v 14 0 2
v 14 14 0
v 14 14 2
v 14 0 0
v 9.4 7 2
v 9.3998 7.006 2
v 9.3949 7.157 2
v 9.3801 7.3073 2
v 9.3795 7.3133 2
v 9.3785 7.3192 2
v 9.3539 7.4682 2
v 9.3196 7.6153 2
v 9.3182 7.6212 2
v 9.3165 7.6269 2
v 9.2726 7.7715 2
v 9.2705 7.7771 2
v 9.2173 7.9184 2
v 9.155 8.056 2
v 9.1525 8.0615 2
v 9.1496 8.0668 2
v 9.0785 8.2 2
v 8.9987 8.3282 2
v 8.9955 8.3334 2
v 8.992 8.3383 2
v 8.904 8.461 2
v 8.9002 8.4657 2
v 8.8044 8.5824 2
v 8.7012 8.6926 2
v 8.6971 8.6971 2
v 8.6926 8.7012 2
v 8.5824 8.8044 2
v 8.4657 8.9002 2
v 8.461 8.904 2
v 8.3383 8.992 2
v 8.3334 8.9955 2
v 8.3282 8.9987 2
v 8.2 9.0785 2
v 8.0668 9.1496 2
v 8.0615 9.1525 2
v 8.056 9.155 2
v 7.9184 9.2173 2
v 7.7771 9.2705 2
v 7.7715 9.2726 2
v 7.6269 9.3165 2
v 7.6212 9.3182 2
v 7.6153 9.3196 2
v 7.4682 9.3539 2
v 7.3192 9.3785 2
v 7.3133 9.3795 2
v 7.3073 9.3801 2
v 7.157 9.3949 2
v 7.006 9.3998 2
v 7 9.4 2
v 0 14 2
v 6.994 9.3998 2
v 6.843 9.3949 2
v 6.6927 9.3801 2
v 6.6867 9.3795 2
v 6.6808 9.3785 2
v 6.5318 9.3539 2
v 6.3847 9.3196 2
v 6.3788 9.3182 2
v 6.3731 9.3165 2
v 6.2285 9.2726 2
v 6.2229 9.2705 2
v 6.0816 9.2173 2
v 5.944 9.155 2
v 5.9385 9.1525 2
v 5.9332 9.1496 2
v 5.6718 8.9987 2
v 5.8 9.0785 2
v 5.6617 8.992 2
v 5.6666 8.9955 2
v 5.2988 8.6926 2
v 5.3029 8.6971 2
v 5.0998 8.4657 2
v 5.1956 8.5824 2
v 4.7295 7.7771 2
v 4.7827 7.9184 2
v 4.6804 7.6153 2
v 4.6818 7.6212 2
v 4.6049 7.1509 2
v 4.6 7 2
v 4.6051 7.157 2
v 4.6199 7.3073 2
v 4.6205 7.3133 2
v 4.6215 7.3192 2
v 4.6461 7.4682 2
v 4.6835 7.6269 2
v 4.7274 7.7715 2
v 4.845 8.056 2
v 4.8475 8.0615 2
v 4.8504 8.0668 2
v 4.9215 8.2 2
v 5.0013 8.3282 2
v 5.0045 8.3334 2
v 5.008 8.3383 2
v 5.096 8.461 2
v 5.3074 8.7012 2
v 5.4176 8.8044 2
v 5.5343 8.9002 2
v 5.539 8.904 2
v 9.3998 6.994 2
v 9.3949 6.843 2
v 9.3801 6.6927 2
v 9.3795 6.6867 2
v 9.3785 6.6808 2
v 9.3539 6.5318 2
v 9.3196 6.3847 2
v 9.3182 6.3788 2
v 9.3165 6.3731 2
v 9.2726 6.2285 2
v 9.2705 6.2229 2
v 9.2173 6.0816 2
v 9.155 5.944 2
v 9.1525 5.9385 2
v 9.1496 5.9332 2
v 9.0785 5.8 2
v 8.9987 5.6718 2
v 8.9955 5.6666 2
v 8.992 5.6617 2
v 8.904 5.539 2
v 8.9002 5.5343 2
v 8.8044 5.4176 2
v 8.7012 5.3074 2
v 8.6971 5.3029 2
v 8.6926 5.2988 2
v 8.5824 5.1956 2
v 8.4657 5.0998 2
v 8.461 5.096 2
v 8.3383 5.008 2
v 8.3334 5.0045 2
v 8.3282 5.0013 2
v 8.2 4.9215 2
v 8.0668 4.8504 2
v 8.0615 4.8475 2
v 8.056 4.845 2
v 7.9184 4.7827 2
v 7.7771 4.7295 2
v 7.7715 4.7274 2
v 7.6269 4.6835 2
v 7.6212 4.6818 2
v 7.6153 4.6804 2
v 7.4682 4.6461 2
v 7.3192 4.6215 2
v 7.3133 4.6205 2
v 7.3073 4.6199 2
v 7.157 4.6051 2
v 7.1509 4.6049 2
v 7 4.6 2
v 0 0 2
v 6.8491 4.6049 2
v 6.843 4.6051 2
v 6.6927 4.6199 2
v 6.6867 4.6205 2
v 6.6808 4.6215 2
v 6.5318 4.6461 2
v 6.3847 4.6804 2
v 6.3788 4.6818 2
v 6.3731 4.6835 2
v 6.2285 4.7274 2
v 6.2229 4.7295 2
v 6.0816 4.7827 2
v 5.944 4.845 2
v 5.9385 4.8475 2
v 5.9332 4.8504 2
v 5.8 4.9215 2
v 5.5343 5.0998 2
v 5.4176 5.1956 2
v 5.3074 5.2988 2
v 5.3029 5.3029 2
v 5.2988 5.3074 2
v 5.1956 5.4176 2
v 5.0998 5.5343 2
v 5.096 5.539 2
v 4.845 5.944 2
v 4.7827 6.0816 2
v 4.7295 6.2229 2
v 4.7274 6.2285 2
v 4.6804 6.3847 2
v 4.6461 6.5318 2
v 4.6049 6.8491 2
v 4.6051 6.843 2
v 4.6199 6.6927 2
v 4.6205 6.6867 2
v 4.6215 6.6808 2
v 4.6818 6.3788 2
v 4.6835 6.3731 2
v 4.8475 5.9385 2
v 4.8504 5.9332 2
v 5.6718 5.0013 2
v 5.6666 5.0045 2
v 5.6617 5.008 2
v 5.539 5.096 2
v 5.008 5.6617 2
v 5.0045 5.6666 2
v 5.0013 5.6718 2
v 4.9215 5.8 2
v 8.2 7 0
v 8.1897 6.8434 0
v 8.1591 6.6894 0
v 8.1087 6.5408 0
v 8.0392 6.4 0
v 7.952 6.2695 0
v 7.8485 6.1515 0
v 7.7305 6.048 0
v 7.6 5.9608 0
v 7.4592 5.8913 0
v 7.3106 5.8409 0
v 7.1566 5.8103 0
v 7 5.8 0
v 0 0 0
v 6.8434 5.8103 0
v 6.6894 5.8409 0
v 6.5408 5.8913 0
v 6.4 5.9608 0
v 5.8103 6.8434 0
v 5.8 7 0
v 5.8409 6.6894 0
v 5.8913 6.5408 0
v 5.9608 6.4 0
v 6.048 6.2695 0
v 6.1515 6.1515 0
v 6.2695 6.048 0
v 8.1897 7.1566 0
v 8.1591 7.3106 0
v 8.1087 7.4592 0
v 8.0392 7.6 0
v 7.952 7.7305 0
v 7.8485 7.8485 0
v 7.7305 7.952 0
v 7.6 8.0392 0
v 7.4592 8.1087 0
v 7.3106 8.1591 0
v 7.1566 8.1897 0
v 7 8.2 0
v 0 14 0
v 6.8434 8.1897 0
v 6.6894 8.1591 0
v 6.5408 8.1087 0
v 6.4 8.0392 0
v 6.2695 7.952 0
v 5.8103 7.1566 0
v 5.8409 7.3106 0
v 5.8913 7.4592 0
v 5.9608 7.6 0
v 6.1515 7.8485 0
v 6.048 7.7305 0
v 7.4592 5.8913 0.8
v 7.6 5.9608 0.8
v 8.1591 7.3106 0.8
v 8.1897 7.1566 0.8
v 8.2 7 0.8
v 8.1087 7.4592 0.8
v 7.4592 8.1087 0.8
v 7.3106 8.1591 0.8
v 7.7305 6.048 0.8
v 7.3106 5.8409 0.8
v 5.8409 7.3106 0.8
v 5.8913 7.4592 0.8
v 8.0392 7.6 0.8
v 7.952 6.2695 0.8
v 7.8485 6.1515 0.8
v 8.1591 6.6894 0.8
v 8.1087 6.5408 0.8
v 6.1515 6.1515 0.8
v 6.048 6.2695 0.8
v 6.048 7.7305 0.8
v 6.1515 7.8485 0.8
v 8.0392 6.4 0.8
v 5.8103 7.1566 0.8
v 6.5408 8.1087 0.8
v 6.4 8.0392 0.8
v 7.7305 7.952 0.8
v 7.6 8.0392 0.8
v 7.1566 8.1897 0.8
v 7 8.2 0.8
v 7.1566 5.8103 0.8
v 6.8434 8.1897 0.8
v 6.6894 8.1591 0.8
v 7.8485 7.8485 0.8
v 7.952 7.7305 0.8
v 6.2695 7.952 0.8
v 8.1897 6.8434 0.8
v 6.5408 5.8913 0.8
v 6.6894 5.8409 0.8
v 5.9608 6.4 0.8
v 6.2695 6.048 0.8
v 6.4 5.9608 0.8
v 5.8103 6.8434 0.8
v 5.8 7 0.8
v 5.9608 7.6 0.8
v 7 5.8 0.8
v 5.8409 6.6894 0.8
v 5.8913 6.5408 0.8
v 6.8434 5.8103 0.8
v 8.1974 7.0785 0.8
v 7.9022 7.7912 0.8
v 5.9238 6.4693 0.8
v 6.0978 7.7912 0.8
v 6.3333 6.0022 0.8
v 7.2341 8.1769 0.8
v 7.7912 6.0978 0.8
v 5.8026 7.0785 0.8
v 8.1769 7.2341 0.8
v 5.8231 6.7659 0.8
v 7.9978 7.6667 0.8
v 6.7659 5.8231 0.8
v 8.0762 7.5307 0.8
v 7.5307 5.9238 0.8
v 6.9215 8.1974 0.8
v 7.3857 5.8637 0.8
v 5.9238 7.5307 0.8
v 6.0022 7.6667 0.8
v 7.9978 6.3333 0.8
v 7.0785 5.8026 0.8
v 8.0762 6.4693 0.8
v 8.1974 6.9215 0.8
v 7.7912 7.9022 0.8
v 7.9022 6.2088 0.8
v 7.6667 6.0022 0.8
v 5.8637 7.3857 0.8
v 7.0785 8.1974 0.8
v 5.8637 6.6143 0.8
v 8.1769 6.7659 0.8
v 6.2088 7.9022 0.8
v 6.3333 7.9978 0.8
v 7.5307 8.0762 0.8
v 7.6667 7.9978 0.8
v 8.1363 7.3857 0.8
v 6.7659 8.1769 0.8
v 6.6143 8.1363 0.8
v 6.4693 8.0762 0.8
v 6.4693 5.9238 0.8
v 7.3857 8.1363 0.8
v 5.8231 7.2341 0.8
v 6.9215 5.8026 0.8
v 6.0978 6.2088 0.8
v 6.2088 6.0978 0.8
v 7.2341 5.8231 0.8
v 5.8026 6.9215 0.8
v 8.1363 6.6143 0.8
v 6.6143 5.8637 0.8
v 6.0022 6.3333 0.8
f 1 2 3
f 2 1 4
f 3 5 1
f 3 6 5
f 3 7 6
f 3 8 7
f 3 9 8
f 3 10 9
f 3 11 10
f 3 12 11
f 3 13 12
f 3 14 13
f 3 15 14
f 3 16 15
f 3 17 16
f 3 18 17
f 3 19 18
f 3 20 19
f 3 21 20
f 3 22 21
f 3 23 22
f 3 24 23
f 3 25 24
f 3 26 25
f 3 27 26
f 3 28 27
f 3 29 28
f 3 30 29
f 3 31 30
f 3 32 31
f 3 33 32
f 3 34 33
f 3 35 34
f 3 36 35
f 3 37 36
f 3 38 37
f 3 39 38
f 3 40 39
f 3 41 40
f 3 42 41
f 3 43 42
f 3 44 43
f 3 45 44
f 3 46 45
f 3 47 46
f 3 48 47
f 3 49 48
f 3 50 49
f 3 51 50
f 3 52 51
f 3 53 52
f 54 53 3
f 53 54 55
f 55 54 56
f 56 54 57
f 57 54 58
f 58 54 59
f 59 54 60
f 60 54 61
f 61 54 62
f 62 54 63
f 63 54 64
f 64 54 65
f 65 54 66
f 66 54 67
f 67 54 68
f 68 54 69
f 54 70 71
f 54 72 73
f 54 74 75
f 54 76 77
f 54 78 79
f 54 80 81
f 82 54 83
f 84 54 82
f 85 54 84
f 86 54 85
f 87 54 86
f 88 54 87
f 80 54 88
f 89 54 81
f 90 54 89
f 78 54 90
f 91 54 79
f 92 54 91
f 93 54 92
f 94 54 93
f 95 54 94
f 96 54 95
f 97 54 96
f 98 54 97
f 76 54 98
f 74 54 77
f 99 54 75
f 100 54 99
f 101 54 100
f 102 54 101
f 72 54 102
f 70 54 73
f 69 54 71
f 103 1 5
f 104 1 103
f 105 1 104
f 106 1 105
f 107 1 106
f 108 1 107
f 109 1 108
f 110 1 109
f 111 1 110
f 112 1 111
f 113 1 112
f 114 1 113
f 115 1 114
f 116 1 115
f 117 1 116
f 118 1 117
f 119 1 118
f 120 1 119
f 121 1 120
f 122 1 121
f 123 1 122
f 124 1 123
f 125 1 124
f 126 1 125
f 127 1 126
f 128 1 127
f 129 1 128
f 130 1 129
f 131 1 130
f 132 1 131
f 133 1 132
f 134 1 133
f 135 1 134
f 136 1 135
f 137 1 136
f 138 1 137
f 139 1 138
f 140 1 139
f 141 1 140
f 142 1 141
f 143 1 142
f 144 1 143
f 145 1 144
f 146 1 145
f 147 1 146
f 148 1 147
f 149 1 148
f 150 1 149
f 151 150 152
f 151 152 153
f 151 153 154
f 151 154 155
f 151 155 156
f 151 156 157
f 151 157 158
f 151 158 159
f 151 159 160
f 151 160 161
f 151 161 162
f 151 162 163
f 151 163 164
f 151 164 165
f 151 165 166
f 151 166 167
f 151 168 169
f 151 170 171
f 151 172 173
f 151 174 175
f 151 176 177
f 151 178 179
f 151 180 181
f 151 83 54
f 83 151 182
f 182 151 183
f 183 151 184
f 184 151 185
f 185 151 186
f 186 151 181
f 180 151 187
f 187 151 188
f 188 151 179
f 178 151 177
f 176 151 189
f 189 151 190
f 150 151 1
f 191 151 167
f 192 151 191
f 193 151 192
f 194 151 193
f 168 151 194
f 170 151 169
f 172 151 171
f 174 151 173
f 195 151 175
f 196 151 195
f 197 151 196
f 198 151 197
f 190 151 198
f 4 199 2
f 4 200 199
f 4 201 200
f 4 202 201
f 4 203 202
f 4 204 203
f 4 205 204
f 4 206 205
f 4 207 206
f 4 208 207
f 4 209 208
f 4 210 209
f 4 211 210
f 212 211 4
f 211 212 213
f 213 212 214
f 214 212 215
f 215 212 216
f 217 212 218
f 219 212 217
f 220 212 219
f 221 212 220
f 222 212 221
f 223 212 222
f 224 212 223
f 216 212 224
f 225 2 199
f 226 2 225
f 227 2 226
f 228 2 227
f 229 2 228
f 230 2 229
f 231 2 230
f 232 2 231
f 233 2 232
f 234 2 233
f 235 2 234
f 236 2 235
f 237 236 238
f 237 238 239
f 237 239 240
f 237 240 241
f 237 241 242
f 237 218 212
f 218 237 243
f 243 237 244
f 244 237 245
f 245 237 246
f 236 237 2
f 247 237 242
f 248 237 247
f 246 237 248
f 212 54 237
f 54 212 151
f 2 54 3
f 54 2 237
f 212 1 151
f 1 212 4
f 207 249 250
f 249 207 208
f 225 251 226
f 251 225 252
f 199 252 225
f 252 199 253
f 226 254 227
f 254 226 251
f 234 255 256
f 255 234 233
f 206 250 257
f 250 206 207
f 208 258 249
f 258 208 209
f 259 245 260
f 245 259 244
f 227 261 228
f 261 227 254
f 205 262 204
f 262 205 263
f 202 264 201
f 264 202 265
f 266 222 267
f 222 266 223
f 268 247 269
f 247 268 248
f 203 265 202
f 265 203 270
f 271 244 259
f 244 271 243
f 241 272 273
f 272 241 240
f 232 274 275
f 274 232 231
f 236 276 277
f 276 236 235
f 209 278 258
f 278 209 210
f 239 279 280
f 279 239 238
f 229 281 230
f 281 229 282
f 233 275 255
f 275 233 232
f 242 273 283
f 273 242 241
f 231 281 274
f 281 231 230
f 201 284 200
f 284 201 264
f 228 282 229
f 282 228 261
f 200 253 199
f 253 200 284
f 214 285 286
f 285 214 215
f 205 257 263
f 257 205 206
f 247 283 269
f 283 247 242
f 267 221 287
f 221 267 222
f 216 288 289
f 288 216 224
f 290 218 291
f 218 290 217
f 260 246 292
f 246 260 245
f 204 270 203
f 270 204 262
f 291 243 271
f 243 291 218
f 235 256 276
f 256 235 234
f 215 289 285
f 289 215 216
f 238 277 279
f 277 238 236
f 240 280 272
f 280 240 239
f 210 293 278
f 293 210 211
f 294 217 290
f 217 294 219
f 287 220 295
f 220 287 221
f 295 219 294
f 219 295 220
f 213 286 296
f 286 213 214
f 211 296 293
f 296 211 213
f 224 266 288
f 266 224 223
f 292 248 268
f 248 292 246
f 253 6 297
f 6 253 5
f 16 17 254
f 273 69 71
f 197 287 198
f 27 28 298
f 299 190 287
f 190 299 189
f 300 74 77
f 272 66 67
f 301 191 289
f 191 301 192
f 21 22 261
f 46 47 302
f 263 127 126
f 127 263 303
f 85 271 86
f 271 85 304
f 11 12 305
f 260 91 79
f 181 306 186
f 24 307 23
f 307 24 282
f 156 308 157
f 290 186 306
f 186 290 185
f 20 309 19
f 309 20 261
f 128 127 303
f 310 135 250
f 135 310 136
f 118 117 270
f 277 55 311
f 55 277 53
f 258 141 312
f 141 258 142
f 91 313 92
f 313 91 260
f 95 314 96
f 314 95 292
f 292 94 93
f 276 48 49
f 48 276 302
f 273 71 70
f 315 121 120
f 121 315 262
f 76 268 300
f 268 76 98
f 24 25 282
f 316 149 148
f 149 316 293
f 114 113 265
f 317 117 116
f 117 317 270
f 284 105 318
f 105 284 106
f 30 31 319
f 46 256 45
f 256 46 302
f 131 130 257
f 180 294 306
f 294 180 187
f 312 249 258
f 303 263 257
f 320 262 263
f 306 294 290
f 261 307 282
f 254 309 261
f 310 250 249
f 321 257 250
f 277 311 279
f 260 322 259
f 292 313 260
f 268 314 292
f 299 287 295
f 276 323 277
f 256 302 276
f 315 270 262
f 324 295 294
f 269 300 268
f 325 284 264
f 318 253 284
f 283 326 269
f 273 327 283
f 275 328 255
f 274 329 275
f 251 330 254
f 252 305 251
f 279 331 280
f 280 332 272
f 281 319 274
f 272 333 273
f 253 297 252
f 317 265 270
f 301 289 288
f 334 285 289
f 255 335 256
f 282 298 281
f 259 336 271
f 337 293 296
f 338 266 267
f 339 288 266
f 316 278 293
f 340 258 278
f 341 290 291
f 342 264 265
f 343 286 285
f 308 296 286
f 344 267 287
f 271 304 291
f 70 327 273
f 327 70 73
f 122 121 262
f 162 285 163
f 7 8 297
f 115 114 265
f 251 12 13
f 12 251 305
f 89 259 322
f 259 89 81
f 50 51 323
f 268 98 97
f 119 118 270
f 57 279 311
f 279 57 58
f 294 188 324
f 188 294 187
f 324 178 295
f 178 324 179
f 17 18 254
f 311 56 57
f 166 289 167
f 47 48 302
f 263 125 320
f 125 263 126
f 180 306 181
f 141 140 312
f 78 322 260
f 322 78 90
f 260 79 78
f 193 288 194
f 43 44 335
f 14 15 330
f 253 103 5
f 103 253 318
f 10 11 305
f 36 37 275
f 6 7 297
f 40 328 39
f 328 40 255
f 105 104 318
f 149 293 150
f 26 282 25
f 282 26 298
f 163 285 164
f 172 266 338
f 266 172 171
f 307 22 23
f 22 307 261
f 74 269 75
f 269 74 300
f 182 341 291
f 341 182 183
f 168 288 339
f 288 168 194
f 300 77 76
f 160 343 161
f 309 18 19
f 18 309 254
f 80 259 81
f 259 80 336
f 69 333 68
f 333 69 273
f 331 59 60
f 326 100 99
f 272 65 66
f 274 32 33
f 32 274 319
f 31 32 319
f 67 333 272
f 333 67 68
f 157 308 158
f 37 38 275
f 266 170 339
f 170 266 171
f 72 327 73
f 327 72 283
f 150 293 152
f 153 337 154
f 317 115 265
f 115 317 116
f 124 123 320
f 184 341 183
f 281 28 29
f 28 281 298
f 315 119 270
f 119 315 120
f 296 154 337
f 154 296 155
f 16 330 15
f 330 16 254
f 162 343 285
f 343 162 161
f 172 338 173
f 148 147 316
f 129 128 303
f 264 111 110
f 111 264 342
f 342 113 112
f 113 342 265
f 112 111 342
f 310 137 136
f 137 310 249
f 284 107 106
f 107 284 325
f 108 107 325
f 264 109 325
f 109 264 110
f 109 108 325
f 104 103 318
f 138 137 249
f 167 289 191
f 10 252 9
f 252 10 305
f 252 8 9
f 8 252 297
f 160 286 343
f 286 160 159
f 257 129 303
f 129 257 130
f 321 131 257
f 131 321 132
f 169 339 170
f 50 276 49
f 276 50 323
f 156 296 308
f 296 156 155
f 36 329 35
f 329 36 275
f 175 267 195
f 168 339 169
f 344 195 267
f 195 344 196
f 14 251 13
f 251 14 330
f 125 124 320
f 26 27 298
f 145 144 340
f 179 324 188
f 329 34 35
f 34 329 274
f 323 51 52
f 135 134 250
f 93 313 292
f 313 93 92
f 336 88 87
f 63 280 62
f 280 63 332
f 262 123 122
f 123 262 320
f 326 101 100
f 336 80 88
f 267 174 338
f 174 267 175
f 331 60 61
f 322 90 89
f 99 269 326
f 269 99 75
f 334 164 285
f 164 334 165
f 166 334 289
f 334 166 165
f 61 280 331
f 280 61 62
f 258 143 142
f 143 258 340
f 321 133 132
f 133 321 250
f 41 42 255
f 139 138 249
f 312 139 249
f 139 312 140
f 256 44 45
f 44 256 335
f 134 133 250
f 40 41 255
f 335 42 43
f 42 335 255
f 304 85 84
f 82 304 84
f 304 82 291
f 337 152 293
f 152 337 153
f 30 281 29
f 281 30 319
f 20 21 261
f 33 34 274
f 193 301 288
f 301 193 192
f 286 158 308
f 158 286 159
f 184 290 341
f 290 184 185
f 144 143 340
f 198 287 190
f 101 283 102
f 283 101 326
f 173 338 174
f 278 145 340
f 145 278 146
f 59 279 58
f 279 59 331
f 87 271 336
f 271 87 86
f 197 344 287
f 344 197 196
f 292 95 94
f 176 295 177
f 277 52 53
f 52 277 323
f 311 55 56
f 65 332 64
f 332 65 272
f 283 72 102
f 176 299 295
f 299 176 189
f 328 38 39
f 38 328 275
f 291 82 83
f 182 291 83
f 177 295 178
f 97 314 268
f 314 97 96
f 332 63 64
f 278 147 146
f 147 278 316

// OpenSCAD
// Screw fit test, mm. part: base or cap. Cone assumes 90 degrees.
part="cap";
module base(){difference(){
translate([0, 0, 0]) cube([14, 14, 12]);
translate([7, 7, 2]) cylinder(h=10.2,r=0.85,$fn=48);
}}
module cap(){difference(){
translate([0, 0, 0]) cube([14, 14, 2]);
translate([7, 7, -0.1]) cylinder(h=2.2,r=1.2,$fn=48);
translate([7, 7, 0.8]) cylinder(h=1.3,r1=1.2,r2=2.5,$fn=96);
}}
if(part=="base") base(); else cap();
